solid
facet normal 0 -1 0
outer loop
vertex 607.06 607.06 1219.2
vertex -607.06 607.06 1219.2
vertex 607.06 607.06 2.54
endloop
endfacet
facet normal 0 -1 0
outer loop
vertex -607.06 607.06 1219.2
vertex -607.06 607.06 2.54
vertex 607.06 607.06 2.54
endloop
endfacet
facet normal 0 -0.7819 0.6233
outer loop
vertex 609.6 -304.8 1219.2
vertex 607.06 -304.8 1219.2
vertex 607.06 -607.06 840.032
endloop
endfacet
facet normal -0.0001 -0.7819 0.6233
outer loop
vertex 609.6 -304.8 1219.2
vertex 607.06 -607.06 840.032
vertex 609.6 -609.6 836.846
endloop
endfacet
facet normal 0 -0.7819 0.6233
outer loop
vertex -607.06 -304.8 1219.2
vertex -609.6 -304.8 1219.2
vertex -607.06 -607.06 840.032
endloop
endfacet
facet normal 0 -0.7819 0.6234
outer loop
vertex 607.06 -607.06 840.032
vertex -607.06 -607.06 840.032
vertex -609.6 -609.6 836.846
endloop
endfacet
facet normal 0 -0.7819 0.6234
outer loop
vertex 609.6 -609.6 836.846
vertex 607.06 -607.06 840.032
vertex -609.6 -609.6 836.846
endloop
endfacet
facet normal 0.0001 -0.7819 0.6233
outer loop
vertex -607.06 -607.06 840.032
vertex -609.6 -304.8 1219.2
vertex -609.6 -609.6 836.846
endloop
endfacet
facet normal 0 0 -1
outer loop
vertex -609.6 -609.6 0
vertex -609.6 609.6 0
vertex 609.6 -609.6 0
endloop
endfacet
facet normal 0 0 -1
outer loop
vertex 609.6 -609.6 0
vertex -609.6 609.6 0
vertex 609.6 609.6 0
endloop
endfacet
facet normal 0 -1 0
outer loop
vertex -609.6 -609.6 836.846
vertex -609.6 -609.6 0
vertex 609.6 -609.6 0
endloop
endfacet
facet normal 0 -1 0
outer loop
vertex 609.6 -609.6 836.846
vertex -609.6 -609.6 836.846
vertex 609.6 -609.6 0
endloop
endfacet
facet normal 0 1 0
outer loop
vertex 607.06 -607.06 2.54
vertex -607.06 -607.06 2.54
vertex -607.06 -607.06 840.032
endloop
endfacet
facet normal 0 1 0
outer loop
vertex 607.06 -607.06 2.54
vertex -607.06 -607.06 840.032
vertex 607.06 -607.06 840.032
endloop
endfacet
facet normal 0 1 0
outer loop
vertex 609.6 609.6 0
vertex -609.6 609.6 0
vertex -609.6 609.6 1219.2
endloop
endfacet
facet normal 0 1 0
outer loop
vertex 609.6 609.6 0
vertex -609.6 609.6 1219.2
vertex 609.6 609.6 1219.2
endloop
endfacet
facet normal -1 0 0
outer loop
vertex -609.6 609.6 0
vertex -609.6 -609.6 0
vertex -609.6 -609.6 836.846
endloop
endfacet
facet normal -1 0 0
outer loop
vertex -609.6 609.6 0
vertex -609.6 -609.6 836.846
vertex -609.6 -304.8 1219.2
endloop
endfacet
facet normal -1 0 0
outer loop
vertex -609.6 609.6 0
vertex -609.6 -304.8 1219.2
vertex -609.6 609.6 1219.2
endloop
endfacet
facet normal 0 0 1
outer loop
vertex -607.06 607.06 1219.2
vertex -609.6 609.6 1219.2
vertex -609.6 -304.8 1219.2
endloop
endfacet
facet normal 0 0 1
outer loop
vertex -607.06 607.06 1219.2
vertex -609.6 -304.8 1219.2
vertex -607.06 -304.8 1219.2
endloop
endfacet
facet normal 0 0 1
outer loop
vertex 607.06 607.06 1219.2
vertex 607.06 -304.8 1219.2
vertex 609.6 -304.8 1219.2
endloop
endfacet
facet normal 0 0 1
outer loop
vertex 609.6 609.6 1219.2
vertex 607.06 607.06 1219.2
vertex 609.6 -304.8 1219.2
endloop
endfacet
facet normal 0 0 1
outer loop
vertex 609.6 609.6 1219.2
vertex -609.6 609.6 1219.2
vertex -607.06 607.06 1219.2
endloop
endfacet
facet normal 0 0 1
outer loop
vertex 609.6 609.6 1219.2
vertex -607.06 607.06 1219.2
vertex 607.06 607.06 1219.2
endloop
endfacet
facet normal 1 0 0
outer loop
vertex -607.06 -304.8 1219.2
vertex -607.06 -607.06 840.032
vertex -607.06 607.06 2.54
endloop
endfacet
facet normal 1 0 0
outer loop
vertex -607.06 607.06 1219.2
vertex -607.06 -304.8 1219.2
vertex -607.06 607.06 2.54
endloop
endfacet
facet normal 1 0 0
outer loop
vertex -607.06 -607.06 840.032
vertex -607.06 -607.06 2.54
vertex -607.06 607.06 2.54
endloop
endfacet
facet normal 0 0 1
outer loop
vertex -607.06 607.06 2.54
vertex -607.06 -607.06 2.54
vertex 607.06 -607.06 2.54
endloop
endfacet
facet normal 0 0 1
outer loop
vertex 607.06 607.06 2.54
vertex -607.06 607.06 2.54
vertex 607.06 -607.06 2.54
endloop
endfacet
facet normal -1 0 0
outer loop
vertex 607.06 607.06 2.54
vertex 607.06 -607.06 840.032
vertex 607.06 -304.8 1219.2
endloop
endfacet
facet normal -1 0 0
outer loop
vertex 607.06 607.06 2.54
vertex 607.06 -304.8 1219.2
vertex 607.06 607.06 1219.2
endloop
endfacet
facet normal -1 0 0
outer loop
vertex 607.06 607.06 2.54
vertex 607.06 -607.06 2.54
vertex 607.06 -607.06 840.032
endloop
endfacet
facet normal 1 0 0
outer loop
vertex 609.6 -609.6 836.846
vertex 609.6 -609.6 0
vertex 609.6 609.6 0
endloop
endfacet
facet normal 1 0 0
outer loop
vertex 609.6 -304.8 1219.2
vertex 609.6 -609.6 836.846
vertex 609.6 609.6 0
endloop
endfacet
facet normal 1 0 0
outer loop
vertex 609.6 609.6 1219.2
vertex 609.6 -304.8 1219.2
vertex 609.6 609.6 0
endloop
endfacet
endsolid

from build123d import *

# Parameters (mm, degrees)
F0_W     = 1219.2
F0_H     = 1219.2
F1_DEPTH = 1219.2
F2_T     = -2.54
F4_DEPTH = 1219.2


with BuildPart() as f1:
    # F0 (on Top) → F1 (new body)
    with BuildSketch(Plane.XY):
        Rectangle(F0_W, F0_H)
    extrude(amount=F1_DEPTH)

    # F2
    f2_openings = [f1.faces().sort_by_distance(p)[0] for p in [
        (0, 0, 1219.2),
    ]]
    offset(amount=F2_T, openings=f2_openings)

    # F3 (on face) → F4 (cut)
    with BuildSketch(Plane(origin=(-609.6, 0, 0), x_dir=(0, -1, 0), z_dir=(-1, 0, 0))):
        Polygon((609.6, 836.845815), (609.6, 1219.2), (304.8, 1219.2), align=None)
    extrude(amount=-F4_DEPTH, mode=Mode.SUBTRACT)


solid = f1.part
